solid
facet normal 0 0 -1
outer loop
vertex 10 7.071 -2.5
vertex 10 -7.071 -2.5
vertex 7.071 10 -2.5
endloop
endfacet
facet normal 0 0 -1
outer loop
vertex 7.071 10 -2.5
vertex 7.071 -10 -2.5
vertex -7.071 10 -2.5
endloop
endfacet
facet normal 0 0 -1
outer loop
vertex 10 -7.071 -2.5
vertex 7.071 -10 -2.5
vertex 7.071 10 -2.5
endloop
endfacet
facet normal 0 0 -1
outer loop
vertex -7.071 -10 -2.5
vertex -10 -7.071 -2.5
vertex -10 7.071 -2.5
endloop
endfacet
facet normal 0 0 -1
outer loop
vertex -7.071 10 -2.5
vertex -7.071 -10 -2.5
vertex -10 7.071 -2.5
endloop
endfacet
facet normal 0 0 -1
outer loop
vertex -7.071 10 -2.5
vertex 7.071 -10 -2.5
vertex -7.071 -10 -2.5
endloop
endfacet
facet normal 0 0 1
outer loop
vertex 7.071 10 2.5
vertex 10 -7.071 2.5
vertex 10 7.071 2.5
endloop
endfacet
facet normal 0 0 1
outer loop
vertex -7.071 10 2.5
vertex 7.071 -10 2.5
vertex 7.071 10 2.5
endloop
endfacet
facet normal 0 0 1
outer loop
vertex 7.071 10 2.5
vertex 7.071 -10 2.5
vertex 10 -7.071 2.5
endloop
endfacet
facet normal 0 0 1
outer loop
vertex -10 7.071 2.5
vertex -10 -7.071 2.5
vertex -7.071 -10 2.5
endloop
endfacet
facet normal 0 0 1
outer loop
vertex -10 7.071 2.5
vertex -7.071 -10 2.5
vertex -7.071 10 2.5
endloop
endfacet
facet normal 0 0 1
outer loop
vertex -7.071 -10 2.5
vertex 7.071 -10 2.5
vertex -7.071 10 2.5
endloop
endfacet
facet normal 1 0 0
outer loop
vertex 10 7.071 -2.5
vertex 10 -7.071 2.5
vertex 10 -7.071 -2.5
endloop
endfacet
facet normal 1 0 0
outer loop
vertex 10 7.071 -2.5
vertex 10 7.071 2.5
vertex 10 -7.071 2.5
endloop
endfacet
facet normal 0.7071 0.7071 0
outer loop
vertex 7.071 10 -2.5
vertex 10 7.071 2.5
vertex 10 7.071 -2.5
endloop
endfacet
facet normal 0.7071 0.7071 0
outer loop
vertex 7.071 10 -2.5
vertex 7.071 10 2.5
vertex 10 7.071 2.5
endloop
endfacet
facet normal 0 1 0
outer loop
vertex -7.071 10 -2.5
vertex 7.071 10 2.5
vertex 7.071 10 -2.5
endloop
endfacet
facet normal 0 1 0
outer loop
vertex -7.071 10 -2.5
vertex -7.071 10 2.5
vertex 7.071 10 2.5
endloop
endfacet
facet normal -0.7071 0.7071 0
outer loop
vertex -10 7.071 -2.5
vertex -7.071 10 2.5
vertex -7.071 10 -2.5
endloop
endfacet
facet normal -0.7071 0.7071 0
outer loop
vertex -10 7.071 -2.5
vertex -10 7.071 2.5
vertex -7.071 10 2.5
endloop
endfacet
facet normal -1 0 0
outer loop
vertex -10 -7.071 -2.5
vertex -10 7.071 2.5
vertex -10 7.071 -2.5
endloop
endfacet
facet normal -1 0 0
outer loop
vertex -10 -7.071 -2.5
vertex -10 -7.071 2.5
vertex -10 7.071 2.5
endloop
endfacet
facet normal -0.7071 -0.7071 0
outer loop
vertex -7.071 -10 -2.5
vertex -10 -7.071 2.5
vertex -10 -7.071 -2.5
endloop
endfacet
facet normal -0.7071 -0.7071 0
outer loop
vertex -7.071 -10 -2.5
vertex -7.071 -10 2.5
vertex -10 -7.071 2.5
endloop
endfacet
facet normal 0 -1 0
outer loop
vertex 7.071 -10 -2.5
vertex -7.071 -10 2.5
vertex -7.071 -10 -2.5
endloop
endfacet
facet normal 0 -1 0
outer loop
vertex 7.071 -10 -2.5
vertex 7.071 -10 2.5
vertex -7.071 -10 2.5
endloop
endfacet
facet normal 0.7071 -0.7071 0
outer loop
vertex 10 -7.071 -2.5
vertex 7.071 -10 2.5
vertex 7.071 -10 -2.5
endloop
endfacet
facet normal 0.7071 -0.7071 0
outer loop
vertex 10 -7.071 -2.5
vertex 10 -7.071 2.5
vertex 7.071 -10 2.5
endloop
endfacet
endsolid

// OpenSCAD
$fn = 64;

/*linear_extrude(height = 20, center = true)
square([20,20], center = true);*/


/*module rounded_square(length, width, radius){
    offset(r = radius)
        square([length-2*radius,width-2*radius], center = true);
    // take 2*radius out because the offset works by adding a periferical skin with the radius in each side
}

linear_extrude(height = 5,center = true)
    rounded_square(20,20,5);*/


module chamfer_square(length, width, chamfer){
    offset(delta = chamfer, chamfer = true)
        square([length-2*chamfer,width-2*chamfer], center = true);
    // take 2*chamfer out because the offset works by adding a periferical skin with the chamfer in each side
}

linear_extrude(height = 5,center = true)
    chamfer_square(20,20,5);
